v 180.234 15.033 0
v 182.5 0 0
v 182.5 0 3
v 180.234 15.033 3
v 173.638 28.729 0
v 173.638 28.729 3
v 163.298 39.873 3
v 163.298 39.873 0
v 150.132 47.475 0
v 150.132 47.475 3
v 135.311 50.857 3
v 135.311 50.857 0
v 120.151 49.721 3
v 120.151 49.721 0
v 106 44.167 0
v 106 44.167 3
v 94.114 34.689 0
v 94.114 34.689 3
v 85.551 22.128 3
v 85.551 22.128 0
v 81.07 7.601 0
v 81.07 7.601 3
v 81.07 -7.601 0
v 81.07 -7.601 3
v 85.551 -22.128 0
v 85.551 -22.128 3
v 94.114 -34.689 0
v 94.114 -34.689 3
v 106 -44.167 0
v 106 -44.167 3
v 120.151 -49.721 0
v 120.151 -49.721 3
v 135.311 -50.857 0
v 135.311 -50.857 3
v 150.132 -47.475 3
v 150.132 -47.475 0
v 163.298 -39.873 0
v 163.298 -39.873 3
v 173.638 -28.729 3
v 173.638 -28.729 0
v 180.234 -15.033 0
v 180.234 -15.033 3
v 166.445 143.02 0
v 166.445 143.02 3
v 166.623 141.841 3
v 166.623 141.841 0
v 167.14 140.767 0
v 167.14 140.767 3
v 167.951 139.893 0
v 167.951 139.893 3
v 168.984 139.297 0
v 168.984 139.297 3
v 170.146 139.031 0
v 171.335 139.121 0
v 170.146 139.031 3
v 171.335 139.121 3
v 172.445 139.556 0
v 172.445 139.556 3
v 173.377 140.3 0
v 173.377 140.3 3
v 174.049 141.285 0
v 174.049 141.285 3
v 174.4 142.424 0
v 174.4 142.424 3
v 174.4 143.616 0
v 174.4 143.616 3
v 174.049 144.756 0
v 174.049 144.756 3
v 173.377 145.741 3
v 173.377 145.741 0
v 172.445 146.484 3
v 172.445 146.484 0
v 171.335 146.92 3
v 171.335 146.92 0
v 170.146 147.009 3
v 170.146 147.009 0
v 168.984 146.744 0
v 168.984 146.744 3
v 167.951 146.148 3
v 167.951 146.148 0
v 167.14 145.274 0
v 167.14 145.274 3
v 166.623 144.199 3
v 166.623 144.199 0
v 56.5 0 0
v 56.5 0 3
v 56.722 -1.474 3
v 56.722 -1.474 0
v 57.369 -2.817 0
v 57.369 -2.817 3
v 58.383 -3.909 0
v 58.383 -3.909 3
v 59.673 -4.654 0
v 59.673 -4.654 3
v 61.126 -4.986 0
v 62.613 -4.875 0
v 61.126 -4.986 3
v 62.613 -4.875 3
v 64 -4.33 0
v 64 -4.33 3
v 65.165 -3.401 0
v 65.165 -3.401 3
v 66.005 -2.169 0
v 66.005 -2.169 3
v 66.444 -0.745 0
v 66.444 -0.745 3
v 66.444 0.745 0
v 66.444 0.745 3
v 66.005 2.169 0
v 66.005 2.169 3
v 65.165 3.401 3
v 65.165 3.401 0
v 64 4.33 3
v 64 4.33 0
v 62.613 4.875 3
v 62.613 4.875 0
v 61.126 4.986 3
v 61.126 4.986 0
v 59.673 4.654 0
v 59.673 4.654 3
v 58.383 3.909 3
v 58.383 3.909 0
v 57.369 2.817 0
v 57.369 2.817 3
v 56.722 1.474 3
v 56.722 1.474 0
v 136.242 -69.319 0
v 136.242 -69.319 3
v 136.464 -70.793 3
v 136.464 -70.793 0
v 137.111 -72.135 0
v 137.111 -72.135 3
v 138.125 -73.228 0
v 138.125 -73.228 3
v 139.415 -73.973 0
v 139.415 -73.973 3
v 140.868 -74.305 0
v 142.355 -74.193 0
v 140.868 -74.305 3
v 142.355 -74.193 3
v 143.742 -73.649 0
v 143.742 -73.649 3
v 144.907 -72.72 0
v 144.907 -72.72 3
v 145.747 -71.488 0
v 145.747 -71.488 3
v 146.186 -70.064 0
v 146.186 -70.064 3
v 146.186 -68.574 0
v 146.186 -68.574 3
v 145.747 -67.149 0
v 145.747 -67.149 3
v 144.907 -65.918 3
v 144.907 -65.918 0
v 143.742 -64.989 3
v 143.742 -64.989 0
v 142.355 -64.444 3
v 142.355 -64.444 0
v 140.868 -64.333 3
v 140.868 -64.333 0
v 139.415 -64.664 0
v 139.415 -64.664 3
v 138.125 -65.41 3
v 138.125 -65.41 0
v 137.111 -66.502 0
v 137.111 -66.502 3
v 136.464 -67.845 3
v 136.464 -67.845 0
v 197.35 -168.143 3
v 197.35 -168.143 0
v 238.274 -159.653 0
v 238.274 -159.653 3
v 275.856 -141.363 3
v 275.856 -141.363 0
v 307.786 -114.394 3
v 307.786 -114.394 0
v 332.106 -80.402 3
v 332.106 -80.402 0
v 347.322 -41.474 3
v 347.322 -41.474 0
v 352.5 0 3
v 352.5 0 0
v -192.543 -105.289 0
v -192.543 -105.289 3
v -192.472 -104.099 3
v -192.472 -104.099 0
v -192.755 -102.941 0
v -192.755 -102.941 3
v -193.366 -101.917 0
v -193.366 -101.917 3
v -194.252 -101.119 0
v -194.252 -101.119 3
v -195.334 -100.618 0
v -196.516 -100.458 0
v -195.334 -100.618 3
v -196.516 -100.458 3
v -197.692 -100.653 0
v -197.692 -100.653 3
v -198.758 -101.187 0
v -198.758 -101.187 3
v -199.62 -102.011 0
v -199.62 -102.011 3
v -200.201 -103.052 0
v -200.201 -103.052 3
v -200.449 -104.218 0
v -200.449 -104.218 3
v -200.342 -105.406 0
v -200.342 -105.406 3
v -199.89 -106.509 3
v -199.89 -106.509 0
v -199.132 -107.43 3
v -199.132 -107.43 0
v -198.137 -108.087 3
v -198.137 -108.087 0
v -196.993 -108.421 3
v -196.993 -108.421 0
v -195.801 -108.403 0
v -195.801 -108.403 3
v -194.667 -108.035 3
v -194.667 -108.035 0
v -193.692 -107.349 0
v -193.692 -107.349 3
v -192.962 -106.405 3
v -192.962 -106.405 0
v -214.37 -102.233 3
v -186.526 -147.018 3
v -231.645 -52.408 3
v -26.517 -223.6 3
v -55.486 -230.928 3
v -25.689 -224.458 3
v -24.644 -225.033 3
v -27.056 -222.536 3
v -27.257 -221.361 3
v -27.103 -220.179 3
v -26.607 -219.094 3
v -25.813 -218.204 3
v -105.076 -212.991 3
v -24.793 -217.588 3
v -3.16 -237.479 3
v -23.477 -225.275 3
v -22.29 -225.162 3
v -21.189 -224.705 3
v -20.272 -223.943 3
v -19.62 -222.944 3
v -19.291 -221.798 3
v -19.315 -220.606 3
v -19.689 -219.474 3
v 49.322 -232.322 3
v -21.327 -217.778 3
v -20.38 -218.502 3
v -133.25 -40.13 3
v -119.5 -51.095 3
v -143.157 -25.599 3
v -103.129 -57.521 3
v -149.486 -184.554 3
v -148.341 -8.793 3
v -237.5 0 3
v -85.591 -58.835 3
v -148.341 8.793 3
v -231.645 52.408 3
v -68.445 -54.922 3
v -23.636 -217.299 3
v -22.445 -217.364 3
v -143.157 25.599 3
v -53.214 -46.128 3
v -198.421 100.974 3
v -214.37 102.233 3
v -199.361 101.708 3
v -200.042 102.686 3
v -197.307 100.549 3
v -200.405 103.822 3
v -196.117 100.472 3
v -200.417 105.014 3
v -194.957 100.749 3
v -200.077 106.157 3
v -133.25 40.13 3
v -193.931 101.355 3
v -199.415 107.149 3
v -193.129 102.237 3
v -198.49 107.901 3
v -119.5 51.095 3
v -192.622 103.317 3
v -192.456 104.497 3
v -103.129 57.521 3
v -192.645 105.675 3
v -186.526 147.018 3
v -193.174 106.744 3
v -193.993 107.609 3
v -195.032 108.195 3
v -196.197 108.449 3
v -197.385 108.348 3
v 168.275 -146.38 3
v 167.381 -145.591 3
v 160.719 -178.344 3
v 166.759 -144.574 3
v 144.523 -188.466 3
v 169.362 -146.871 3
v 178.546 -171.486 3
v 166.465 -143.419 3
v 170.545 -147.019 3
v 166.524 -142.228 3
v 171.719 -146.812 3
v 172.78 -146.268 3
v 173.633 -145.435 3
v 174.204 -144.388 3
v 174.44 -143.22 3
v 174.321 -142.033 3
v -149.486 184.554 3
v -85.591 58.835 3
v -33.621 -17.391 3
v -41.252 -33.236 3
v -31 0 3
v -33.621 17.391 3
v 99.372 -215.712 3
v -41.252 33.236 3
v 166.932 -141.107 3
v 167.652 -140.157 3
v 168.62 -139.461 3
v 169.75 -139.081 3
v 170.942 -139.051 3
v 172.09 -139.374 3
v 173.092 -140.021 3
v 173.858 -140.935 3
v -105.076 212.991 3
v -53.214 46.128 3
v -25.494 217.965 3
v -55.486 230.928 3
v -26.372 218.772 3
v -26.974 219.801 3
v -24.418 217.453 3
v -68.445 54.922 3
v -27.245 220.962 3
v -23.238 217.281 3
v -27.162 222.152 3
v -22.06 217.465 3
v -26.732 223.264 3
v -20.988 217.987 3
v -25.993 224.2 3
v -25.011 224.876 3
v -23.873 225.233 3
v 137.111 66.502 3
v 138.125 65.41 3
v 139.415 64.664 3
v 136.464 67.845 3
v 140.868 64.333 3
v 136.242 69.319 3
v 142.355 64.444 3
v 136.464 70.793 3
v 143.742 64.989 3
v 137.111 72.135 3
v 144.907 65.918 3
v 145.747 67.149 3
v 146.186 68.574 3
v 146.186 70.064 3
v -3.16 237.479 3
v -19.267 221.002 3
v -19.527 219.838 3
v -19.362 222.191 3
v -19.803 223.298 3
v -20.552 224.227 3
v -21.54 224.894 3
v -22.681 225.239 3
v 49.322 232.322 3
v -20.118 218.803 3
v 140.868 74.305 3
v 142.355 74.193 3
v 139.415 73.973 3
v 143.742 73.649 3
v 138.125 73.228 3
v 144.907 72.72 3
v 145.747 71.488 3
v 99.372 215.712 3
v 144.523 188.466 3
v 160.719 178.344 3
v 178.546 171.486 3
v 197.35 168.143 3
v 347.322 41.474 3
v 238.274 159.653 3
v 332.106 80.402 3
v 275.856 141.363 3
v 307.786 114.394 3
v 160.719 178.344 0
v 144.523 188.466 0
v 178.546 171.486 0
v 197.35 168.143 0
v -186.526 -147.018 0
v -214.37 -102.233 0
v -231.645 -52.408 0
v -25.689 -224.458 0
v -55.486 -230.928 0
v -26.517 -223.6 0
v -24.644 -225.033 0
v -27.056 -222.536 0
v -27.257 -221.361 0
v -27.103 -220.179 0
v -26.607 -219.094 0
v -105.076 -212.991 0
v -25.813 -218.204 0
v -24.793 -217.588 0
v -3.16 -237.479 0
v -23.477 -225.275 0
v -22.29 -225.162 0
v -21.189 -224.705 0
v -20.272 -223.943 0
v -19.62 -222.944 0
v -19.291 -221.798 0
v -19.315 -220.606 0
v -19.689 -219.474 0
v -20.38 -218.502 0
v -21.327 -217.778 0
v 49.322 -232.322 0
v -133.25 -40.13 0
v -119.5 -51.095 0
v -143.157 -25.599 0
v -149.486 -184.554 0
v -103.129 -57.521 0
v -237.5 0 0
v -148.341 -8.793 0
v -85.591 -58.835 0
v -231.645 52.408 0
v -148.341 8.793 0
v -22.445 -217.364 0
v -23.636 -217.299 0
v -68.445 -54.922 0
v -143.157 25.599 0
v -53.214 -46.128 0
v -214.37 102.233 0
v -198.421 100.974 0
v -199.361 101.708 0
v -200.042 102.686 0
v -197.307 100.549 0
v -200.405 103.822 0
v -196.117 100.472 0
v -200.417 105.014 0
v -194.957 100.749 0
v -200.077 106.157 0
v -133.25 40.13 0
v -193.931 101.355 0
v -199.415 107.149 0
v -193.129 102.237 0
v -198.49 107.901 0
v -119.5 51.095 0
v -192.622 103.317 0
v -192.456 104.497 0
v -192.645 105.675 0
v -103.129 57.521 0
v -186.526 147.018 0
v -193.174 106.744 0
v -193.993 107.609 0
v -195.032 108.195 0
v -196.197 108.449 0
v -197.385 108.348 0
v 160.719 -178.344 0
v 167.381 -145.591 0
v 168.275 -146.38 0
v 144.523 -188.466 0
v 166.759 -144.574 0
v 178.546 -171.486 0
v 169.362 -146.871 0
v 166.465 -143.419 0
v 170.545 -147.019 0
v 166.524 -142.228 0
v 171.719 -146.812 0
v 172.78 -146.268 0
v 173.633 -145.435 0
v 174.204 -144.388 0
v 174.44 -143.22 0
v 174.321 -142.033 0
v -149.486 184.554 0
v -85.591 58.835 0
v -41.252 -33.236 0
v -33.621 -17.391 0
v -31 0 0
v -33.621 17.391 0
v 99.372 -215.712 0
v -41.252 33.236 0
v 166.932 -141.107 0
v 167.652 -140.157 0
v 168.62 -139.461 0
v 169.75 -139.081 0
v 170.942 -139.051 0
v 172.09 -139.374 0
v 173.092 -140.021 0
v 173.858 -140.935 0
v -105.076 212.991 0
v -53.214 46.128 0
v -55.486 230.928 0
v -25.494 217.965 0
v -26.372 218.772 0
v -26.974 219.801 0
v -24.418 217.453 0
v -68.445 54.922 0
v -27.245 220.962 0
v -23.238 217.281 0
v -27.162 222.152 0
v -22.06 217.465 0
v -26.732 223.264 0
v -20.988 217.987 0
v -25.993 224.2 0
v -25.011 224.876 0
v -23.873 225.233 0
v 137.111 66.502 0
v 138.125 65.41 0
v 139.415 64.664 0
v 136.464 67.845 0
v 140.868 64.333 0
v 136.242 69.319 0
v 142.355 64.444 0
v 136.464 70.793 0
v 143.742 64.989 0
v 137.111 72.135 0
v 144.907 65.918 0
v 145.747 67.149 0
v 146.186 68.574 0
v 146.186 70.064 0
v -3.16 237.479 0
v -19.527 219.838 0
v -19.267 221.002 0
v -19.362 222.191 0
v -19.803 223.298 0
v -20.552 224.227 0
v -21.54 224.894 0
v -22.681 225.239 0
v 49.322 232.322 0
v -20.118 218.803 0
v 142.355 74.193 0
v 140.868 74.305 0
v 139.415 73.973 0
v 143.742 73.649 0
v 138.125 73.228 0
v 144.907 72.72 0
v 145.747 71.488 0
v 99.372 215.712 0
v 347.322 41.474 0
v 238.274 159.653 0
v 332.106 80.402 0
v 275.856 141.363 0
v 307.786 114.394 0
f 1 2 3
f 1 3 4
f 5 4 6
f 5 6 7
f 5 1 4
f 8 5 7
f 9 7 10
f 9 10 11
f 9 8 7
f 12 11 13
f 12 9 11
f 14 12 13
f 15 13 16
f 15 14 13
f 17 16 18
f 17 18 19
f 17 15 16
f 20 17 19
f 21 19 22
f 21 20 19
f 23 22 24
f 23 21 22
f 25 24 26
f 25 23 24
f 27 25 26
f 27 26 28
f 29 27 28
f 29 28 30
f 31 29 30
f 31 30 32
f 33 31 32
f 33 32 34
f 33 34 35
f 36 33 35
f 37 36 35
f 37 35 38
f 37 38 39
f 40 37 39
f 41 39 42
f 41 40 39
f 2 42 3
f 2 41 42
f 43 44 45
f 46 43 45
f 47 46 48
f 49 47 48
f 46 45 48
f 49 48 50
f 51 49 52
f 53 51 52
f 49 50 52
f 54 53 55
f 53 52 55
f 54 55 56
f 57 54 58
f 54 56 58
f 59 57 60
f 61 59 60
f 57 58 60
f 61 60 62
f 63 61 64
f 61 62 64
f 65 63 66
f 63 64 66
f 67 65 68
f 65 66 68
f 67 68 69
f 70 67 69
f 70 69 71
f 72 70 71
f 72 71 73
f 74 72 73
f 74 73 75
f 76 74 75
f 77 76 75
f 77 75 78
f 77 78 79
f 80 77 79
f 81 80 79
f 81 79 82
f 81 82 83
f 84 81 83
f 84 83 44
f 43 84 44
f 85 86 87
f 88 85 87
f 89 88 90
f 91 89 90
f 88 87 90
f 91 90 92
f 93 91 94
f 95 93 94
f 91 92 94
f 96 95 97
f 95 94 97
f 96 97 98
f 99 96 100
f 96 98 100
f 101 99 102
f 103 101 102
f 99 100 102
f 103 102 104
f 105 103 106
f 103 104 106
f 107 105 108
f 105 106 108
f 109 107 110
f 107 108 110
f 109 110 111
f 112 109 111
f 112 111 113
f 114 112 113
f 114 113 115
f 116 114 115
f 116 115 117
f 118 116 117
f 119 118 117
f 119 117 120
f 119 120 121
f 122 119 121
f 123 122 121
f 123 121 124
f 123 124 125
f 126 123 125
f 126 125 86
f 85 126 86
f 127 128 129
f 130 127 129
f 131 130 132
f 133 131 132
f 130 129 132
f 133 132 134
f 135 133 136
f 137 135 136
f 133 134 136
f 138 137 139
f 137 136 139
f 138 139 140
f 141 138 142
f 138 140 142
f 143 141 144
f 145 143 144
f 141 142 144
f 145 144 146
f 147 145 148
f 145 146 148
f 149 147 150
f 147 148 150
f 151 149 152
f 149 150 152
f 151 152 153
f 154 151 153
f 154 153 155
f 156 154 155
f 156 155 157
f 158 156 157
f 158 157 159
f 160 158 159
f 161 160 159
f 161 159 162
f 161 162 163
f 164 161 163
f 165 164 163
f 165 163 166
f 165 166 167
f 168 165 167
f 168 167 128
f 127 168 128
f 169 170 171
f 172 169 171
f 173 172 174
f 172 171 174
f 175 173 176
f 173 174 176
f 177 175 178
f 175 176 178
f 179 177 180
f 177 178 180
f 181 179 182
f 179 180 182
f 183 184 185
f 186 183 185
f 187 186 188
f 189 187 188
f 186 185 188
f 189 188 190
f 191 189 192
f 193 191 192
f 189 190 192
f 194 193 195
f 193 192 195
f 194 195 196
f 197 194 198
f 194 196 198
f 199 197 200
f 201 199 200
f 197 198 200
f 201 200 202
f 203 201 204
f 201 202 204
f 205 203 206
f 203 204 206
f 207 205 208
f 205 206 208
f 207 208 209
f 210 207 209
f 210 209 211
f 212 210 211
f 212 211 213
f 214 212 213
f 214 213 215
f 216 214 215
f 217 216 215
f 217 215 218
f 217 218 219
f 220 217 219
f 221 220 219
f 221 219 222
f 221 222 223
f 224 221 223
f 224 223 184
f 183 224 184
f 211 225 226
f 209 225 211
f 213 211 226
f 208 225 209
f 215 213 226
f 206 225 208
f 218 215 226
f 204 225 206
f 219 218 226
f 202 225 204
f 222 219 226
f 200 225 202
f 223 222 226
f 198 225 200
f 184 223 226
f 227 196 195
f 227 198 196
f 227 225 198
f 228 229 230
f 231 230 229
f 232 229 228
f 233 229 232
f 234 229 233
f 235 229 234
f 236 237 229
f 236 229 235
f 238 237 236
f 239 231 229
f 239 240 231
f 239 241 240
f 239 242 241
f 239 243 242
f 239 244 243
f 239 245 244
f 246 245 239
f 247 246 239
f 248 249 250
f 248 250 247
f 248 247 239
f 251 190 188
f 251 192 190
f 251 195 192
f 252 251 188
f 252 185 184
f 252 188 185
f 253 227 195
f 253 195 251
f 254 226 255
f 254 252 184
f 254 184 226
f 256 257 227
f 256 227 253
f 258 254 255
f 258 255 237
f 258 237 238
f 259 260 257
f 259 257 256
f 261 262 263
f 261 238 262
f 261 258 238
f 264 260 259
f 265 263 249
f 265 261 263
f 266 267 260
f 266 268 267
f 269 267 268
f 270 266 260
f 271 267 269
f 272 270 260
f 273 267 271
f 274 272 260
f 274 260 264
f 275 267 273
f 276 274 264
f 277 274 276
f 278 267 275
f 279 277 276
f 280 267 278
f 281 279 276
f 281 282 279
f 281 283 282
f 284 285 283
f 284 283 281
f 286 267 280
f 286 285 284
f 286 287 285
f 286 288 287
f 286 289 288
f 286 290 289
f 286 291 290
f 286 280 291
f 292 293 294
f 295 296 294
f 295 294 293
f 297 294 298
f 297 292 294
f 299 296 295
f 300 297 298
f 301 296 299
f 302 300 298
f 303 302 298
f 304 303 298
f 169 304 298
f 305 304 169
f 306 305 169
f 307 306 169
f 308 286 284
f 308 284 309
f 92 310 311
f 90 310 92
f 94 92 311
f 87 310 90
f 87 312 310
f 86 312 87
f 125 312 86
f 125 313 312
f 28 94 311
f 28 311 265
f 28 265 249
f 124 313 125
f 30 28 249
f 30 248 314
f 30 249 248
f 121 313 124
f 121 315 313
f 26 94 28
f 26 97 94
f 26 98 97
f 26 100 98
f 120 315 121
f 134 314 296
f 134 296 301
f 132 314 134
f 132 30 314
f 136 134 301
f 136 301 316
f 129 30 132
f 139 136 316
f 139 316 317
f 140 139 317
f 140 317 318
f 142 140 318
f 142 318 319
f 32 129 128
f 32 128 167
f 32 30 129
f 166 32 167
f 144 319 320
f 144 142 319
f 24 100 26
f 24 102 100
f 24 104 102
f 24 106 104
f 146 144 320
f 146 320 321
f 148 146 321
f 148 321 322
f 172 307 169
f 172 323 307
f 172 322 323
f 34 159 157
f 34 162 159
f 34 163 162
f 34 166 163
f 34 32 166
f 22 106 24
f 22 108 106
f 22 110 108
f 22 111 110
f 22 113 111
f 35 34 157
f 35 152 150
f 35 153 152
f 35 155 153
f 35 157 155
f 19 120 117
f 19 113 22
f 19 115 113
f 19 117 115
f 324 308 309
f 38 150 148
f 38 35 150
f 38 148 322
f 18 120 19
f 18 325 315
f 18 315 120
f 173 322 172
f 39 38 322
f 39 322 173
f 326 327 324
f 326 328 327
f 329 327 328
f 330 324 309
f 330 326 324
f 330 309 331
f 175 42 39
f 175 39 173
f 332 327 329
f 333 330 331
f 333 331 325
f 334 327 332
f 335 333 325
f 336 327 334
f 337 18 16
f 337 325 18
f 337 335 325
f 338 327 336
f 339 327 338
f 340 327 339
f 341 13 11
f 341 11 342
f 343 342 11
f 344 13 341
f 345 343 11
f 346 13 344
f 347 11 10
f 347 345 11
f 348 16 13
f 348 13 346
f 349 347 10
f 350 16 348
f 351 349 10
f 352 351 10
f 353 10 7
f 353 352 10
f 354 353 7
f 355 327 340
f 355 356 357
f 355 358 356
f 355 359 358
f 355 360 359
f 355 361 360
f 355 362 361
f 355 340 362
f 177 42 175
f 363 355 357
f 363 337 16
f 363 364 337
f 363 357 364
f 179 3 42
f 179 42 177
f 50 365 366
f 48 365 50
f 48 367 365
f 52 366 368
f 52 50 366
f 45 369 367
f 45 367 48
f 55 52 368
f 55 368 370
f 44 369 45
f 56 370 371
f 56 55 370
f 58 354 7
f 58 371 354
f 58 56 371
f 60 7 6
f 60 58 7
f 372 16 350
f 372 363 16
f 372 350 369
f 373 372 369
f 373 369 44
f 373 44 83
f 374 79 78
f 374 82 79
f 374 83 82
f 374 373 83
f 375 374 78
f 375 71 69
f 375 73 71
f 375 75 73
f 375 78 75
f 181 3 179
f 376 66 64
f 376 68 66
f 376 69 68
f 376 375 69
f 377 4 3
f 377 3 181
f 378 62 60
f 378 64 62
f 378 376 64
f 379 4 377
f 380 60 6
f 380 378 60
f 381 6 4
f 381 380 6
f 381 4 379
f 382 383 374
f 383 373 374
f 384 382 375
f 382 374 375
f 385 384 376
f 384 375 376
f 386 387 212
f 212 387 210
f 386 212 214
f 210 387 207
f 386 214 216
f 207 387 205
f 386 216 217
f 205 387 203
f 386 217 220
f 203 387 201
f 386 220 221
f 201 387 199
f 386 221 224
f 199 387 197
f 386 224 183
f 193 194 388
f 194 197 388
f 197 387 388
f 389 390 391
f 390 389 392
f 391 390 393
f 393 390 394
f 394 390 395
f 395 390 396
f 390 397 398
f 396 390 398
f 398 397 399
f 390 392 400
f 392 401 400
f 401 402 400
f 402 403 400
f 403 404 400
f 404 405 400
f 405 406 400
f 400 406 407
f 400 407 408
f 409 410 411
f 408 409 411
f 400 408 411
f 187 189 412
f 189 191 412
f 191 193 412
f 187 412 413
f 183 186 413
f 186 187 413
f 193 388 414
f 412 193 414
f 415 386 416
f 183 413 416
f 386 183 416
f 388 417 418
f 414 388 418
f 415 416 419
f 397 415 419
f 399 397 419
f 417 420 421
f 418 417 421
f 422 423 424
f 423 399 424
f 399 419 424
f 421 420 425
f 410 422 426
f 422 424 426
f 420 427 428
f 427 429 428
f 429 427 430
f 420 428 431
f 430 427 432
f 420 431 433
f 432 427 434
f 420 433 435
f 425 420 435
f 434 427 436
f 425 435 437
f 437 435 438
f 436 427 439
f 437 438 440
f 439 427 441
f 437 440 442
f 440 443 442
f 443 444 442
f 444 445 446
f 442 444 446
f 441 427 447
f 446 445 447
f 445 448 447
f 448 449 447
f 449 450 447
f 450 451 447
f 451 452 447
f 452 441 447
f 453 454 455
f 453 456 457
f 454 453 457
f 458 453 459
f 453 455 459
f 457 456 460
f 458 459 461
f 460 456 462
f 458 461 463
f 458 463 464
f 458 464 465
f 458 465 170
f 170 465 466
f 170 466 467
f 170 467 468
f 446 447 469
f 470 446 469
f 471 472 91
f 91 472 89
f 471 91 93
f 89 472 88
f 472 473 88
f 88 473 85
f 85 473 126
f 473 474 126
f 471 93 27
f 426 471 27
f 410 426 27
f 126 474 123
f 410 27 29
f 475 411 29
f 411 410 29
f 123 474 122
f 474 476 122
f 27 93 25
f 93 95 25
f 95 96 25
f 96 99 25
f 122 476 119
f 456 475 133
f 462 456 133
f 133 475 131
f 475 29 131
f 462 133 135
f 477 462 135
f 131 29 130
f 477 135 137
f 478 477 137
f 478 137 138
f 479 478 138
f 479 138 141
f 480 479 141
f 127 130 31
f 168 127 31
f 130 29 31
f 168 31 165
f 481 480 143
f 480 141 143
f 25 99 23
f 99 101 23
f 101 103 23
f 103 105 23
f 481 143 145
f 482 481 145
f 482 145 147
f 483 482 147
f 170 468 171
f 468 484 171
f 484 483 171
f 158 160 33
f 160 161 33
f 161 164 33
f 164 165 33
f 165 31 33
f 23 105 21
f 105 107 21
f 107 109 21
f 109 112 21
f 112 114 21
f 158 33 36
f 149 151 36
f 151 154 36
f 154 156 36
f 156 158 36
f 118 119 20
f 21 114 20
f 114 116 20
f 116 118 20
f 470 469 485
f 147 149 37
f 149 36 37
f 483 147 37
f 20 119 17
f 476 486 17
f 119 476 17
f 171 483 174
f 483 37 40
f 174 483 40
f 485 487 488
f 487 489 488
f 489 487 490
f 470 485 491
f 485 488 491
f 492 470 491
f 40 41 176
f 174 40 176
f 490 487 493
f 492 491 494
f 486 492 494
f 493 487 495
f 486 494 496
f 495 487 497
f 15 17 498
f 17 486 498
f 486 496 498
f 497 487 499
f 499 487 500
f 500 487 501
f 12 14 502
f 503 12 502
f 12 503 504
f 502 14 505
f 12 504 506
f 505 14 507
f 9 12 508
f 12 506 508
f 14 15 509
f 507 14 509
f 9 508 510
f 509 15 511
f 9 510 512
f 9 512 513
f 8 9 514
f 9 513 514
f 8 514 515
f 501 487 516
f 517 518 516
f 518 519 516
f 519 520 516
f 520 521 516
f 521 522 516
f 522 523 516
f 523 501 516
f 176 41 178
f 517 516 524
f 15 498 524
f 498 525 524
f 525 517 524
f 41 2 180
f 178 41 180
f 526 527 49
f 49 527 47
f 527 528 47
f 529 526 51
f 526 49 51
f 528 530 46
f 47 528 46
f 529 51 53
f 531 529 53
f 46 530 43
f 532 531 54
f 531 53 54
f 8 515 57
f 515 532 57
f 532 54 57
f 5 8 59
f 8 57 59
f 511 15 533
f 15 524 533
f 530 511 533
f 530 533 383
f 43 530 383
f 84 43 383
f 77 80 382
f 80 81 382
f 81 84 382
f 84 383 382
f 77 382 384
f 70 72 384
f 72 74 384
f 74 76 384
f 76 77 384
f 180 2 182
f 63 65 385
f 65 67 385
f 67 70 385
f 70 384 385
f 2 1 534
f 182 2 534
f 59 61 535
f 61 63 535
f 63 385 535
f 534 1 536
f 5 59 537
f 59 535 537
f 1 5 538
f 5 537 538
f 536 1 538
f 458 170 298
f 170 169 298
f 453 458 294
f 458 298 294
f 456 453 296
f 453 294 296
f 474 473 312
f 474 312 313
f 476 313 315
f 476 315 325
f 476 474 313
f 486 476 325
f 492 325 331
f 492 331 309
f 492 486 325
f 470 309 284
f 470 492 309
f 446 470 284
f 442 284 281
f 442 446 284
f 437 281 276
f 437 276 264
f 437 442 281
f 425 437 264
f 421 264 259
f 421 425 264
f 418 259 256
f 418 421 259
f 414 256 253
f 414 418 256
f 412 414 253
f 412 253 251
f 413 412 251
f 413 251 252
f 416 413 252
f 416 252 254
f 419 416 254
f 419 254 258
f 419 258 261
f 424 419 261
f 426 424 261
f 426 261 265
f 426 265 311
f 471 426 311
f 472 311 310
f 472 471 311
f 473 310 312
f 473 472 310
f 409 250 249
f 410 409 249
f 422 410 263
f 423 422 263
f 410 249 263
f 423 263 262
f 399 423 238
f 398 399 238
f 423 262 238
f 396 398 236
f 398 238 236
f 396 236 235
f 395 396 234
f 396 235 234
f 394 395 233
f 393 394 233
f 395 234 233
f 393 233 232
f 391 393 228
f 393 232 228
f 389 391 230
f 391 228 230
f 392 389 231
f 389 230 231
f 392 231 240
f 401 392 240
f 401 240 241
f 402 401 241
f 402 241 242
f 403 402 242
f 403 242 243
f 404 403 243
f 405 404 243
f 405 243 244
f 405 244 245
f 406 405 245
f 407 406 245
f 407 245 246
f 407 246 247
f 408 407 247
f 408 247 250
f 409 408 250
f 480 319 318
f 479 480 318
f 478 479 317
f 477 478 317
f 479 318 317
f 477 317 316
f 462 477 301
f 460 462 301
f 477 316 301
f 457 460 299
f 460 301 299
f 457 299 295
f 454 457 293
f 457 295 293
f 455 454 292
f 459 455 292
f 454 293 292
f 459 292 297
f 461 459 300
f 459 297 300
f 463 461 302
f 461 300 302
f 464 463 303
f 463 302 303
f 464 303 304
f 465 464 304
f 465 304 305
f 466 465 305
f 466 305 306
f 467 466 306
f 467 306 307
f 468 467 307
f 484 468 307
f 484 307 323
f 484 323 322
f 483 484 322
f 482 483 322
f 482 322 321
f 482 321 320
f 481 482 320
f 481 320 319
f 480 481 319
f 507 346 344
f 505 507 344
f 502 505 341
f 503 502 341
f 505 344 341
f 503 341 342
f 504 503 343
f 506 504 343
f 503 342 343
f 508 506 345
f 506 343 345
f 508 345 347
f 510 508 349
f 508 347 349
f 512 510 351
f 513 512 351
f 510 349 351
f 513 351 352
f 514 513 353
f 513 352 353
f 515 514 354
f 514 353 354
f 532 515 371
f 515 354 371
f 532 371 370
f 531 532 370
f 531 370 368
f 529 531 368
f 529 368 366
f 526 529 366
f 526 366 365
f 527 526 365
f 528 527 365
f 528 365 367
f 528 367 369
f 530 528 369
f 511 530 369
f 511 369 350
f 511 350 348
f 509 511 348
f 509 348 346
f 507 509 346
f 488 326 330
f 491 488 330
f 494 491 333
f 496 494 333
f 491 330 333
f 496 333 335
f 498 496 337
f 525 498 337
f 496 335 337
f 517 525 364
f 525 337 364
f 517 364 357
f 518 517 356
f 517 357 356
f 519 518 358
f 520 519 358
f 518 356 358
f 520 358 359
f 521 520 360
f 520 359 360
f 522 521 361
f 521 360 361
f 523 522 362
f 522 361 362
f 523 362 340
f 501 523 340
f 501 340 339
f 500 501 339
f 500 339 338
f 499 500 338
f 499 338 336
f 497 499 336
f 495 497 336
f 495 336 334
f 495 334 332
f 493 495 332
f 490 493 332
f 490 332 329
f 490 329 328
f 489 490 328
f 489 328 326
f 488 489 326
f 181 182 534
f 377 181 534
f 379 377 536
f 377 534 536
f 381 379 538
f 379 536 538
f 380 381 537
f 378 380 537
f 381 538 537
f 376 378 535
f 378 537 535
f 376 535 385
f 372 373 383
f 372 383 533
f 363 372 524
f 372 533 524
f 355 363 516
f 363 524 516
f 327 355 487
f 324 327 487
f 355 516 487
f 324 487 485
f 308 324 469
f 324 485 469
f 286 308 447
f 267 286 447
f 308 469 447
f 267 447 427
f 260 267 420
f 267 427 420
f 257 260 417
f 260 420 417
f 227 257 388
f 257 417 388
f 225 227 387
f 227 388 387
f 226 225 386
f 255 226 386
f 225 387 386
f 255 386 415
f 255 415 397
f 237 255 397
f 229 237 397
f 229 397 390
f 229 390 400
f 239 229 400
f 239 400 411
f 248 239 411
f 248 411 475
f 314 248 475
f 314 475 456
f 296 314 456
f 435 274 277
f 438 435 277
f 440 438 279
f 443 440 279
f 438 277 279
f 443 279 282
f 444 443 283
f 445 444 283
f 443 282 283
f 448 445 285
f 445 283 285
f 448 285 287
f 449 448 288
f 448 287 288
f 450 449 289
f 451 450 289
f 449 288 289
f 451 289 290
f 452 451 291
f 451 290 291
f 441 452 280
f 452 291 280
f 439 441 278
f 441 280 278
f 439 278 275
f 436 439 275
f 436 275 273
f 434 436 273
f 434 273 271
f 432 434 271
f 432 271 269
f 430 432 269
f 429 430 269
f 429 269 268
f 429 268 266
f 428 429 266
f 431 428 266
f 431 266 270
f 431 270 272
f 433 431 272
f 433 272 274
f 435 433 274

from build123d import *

# Parameters (mm, degrees)
F0_R            = 59
F0_R_2          = 51
F1_DEPTH        = 3
F2_R            = 100
F3_D            = 8
F3_COPIES_COUNT = 6
F3_COPIES_ANGLE = 280
F4_D            = 10


# Not quite as in the source:
# - a pattern or mirror of a feature is missing from the dataset's text; its kind, count and spacing are read off the source's solid


with BuildPart() as f1:
    # F0 (on Top) → F1 (new body)
    with BuildSketch(Plane.XY):
        with BuildLine():
            ThreePointArc((167.9378605318, -167.9378605318), (297.3413197874, -124.7660894685), (352.5, 0))
            ThreePointArc((352.5, 0), (297.3413197874, 124.7660894685), (167.9378605318, 167.9378605318))
            ThreePointArc((167.9378605318, 167.9378605318), (-237.5, 0), (167.9378605318, -167.9378605318))
        make_face()
        with Locations((-90, 0)):
            Circle(F0_R, mode=Mode.SUBTRACT)
        with Locations((131.5, 0)):
            Circle(F0_R_2, mode=Mode.SUBTRACT)
    extrude(amount=F1_DEPTH)

    # F2
    f2_edges = [f1.edges().sort_by_distance(p)[0] for p in [
        (167.937861, -167.937861, 1.5),
        (167.937861, 167.937861, 1.5),
    ]]
    fillet(f2_edges, radius=F2_R)

    # F3 (through all)
    with Locations(Plane(origin=(0, 0, 0), x_dir=(1, 0, 0), z_dir=(0, 0, -1))):
        with Locations((170.444888594, -143.0202431553)):
            f3 = Hole(F3_D / 2)

    # F3_copies: F3 ×6 about axis
    f3_copies_axis = Axis((0, 0, 0), (0, 0, 1))
    for i in range(1, F3_COPIES_COUNT):
        add(f3.rotate(f3_copies_axis, i * F3_COPIES_ANGLE / (F3_COPIES_COUNT - 1)), mode=Mode.SUBTRACT)

    # F4 (through all)
    with Locations(Plane(origin=(0, 0, 0), x_dir=(1, 0, 0), z_dir=(0, 0, -1))):
        with Locations((141.2421170672, -69.3187648119), (61.5, 0), (141.2421170672, 69.3187648119)):
            Hole(F4_D / 2)


solid = f1.part
